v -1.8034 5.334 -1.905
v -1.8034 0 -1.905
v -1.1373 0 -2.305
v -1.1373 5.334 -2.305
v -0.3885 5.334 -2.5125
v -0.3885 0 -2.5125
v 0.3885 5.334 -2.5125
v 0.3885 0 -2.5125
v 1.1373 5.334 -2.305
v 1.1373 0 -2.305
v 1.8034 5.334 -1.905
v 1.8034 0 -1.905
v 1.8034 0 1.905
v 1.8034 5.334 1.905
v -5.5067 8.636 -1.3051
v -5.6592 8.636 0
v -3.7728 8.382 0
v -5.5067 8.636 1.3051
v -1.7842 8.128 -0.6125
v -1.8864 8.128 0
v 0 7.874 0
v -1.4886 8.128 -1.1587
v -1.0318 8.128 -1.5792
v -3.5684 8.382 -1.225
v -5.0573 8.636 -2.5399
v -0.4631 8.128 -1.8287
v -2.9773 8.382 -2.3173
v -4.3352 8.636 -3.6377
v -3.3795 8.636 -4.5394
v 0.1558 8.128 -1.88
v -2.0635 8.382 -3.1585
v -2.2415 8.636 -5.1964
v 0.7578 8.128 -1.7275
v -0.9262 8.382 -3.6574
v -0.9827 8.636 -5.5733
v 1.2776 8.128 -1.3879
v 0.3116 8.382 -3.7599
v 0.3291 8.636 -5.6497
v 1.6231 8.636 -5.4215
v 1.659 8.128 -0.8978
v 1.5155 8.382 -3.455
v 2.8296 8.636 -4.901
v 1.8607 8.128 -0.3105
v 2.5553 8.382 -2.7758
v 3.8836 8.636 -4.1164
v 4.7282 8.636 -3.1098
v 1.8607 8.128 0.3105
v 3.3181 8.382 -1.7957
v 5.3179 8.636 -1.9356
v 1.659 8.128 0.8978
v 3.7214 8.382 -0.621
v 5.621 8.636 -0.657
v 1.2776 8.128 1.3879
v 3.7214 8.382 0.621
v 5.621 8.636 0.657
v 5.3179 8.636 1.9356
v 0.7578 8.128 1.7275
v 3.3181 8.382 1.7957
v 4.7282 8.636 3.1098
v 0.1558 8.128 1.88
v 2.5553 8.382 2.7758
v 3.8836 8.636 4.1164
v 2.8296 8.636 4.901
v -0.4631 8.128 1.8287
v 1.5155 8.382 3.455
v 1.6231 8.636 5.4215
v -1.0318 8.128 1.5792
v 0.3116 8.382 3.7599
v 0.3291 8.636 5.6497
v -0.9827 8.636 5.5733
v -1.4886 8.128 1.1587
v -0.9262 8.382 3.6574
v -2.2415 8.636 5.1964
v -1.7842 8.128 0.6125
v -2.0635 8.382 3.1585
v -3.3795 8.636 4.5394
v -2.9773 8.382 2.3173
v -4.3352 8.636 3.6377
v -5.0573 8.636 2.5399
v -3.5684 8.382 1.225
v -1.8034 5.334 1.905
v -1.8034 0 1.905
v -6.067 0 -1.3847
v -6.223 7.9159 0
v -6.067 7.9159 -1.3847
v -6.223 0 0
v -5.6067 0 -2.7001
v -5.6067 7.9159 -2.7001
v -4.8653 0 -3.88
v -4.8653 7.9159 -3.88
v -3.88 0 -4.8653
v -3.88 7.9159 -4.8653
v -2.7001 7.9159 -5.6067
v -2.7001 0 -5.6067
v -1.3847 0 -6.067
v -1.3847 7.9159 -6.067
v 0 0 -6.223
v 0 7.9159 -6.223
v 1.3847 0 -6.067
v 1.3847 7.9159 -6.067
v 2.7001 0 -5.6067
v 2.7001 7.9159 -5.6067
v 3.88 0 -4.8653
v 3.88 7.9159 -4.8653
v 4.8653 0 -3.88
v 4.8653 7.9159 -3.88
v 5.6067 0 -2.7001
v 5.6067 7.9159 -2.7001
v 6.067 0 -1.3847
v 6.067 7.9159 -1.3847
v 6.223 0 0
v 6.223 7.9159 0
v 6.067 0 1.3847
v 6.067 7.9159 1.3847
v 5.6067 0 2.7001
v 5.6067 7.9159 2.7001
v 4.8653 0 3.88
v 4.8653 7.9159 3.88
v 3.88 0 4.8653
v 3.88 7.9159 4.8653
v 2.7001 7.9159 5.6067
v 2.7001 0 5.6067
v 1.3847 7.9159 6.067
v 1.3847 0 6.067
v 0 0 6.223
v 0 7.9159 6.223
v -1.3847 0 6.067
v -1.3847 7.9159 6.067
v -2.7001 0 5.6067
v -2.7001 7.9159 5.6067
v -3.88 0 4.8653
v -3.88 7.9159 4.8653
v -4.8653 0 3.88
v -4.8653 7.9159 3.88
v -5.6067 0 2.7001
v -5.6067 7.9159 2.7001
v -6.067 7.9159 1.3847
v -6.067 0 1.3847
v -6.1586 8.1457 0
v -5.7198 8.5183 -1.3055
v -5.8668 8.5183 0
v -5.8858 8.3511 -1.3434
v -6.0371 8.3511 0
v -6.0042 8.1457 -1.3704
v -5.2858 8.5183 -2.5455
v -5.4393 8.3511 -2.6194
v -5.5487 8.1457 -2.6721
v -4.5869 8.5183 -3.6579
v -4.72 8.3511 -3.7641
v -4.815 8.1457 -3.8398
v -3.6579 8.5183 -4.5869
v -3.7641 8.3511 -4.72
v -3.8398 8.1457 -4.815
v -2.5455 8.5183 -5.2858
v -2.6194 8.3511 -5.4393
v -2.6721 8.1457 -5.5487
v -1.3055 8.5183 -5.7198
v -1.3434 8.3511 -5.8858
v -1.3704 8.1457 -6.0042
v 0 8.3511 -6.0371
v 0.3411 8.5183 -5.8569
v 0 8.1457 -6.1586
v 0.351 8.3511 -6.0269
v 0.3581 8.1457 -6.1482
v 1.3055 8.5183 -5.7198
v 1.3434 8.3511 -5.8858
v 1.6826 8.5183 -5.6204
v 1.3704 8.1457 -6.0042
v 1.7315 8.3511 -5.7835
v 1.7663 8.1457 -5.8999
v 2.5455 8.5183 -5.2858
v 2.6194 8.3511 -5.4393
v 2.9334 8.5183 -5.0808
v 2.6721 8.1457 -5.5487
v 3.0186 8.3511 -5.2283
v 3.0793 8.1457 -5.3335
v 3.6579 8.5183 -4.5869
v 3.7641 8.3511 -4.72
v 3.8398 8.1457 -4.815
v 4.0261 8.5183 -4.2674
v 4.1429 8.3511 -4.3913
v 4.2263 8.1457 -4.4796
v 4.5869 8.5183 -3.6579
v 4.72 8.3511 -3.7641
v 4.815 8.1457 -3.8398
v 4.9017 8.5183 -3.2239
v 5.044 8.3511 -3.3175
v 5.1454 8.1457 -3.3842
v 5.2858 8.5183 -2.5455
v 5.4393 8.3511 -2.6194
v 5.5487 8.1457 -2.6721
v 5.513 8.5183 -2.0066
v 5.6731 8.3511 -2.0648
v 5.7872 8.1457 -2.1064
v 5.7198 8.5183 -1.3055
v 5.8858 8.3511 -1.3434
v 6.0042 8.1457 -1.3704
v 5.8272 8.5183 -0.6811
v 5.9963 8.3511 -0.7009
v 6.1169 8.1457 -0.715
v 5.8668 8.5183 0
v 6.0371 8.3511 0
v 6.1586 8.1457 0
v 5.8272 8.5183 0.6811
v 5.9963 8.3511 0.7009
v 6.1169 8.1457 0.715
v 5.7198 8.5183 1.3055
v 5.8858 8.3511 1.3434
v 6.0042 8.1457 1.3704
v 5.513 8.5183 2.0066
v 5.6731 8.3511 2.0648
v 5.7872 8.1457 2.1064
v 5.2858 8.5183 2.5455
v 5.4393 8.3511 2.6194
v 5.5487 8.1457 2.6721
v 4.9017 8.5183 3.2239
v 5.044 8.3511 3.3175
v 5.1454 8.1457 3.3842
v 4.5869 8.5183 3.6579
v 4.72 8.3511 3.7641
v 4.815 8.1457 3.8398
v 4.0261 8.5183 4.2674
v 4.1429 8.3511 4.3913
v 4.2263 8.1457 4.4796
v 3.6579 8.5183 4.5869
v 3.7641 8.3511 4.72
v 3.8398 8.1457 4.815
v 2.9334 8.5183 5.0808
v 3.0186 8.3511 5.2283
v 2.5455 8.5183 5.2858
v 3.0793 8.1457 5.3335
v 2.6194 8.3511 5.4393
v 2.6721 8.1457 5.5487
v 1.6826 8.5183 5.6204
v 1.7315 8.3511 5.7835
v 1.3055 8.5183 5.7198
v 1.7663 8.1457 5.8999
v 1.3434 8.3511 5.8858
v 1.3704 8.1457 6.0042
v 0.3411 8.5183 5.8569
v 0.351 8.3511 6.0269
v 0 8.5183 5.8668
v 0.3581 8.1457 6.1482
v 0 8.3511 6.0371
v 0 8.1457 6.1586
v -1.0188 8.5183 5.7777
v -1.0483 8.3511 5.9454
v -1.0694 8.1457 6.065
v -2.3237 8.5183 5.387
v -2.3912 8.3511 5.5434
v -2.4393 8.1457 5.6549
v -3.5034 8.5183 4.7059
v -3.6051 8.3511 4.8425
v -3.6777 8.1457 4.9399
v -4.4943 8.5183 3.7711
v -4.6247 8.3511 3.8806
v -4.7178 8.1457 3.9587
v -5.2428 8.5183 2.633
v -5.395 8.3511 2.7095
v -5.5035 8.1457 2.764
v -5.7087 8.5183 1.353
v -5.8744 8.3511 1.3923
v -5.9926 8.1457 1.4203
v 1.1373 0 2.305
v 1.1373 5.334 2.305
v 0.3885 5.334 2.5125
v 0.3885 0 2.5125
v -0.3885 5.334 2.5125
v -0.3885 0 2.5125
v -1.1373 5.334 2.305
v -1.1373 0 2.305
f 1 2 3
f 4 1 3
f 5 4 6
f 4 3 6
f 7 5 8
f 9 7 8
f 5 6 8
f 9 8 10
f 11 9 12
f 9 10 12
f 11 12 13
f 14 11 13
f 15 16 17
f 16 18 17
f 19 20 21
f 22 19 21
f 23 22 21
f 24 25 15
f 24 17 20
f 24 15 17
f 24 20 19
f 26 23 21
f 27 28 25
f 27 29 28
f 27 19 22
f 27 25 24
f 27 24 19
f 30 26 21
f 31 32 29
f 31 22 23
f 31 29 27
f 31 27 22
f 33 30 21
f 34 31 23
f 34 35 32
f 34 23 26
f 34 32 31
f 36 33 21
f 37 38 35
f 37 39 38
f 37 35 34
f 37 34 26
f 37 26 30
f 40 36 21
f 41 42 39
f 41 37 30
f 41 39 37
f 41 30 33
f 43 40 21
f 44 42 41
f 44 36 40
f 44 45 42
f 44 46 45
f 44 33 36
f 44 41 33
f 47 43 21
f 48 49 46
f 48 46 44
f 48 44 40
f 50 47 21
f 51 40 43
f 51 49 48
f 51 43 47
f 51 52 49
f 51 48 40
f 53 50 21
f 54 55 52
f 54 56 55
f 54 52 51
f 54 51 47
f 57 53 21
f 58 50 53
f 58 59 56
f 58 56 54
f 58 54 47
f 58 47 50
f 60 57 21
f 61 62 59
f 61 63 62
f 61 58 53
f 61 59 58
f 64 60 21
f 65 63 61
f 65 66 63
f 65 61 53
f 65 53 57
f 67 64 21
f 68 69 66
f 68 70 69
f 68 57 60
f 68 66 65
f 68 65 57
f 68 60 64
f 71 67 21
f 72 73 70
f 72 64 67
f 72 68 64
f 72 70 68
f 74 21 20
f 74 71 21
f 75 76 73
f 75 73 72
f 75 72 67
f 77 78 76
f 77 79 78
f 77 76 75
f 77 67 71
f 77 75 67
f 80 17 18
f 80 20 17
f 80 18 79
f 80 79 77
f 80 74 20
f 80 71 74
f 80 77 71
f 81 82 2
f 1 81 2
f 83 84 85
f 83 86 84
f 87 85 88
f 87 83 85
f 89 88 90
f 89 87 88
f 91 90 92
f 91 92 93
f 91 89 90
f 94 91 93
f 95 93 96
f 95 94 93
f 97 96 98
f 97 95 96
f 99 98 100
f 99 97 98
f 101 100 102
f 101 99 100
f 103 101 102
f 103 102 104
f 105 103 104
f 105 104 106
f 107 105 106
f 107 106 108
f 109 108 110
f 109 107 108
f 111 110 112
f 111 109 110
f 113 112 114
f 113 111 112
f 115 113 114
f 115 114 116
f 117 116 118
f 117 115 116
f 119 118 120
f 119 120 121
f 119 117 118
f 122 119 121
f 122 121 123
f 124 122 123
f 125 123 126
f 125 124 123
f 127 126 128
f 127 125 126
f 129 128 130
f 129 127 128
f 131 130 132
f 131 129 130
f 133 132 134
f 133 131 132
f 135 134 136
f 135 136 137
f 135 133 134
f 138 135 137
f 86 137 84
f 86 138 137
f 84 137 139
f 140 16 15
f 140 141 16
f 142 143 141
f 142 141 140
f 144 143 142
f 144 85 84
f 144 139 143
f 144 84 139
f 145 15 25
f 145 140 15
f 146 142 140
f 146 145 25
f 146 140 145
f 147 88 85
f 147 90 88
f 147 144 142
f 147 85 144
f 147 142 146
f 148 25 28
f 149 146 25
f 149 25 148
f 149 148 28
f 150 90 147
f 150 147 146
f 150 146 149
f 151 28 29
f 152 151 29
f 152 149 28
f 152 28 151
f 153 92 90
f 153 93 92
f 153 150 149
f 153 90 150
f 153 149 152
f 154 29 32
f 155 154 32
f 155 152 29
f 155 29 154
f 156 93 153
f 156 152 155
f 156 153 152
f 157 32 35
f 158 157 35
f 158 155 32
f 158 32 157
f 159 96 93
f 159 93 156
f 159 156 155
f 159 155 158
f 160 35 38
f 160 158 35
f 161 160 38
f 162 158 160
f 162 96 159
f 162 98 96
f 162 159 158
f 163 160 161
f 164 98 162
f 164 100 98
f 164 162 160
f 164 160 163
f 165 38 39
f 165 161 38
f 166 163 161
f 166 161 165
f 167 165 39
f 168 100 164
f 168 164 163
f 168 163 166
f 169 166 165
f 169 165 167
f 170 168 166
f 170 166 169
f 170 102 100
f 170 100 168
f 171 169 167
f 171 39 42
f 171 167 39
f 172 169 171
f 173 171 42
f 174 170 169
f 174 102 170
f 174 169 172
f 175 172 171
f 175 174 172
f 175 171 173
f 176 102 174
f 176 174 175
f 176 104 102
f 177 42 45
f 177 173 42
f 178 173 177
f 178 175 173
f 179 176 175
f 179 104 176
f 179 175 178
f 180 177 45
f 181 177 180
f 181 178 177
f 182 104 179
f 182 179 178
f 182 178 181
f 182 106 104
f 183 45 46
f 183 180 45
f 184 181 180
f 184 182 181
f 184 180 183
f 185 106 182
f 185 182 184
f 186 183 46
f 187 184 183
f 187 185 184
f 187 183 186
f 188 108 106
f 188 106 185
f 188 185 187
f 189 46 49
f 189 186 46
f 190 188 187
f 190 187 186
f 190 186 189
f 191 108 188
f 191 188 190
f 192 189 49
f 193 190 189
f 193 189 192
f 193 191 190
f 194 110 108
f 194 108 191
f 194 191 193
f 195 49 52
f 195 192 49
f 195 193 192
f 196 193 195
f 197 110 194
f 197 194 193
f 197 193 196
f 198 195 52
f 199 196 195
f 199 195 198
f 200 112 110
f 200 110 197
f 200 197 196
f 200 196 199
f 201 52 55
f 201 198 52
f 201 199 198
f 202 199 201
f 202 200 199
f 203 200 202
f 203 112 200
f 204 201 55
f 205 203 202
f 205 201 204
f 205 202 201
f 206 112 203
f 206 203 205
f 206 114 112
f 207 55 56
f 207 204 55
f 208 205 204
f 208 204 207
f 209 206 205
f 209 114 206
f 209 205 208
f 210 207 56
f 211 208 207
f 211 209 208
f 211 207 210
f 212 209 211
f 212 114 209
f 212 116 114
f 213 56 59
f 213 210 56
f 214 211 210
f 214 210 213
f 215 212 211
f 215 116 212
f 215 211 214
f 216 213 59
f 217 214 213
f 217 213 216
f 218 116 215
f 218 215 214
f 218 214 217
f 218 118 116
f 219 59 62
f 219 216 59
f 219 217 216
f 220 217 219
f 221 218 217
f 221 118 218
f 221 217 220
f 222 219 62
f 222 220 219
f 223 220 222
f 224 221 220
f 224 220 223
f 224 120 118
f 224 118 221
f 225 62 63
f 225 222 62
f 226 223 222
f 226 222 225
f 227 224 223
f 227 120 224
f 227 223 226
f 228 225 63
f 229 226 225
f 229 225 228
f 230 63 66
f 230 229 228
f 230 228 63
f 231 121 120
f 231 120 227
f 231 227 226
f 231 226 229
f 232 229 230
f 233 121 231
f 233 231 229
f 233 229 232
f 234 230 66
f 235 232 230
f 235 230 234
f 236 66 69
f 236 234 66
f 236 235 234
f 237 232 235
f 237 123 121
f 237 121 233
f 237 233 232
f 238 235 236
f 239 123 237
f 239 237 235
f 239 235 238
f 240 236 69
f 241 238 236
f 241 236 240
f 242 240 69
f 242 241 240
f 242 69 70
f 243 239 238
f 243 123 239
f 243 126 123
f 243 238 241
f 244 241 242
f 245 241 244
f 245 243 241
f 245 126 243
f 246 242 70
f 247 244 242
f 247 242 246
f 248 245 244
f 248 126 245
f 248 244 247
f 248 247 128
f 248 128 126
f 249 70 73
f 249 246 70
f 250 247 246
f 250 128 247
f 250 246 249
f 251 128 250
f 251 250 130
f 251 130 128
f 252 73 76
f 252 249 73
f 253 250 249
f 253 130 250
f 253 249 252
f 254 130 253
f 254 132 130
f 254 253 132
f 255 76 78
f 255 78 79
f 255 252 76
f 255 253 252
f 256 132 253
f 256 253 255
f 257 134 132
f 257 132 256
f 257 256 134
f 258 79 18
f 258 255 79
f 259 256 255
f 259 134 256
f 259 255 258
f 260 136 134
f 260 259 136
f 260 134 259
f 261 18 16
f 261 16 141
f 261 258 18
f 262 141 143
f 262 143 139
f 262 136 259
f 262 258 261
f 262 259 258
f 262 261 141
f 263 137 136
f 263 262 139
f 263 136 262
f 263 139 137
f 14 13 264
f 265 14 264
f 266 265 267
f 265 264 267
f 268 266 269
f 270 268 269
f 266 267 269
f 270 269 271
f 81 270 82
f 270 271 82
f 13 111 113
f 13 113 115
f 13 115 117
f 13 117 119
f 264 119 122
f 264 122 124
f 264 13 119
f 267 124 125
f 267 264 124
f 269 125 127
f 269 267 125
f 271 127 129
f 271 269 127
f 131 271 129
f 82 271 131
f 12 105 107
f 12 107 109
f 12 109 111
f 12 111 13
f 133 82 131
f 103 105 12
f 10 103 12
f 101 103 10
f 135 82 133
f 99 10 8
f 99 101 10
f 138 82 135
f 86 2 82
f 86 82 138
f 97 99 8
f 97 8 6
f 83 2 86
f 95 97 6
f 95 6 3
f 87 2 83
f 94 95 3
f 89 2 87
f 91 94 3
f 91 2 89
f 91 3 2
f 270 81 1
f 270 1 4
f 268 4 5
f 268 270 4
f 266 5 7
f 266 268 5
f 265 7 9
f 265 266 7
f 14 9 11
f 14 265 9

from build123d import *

# Parameters (mm, degrees)
F3_DEPTH = 5.334


with BuildPart() as f1:
    # F0 (on Top) → F1 (revolve)
    with BuildSketch(Plane.XY):
        with BuildLine():
            Line((-6.223, 0), (0, 0))
            Line((0, 0), (0, 7.874))
            Line((0, 7.874), (-5.659229, 8.636))
            ThreePointArc((-5.659229, 8.636), (-6.037134, 8.351132), (-6.223, 7.915913))
            Line((-6.223, 7.915913), (-6.223, 0))
        make_face()
    revolve(axis=Axis((0, 3.937, 0), (0, -1, 0)))

    # F2 (on Front) → F3 (cut)
    with BuildSketch(Plane.XZ):
        with BuildLine():
            Line((1.8034, -1.905), (1.8034, 1.905))
            ThreePointArc((1.8034, 1.905), (0, 2.538774), (-1.8034, 1.905))
            Line((-1.8034, 1.905), (-1.8034, -1.905))
            ThreePointArc((-1.8034, -1.905), (0, -2.538774), (1.8034, -1.905))
        make_face()
    extrude(amount=-F3_DEPTH, mode=Mode.SUBTRACT)


solid = f1.part
